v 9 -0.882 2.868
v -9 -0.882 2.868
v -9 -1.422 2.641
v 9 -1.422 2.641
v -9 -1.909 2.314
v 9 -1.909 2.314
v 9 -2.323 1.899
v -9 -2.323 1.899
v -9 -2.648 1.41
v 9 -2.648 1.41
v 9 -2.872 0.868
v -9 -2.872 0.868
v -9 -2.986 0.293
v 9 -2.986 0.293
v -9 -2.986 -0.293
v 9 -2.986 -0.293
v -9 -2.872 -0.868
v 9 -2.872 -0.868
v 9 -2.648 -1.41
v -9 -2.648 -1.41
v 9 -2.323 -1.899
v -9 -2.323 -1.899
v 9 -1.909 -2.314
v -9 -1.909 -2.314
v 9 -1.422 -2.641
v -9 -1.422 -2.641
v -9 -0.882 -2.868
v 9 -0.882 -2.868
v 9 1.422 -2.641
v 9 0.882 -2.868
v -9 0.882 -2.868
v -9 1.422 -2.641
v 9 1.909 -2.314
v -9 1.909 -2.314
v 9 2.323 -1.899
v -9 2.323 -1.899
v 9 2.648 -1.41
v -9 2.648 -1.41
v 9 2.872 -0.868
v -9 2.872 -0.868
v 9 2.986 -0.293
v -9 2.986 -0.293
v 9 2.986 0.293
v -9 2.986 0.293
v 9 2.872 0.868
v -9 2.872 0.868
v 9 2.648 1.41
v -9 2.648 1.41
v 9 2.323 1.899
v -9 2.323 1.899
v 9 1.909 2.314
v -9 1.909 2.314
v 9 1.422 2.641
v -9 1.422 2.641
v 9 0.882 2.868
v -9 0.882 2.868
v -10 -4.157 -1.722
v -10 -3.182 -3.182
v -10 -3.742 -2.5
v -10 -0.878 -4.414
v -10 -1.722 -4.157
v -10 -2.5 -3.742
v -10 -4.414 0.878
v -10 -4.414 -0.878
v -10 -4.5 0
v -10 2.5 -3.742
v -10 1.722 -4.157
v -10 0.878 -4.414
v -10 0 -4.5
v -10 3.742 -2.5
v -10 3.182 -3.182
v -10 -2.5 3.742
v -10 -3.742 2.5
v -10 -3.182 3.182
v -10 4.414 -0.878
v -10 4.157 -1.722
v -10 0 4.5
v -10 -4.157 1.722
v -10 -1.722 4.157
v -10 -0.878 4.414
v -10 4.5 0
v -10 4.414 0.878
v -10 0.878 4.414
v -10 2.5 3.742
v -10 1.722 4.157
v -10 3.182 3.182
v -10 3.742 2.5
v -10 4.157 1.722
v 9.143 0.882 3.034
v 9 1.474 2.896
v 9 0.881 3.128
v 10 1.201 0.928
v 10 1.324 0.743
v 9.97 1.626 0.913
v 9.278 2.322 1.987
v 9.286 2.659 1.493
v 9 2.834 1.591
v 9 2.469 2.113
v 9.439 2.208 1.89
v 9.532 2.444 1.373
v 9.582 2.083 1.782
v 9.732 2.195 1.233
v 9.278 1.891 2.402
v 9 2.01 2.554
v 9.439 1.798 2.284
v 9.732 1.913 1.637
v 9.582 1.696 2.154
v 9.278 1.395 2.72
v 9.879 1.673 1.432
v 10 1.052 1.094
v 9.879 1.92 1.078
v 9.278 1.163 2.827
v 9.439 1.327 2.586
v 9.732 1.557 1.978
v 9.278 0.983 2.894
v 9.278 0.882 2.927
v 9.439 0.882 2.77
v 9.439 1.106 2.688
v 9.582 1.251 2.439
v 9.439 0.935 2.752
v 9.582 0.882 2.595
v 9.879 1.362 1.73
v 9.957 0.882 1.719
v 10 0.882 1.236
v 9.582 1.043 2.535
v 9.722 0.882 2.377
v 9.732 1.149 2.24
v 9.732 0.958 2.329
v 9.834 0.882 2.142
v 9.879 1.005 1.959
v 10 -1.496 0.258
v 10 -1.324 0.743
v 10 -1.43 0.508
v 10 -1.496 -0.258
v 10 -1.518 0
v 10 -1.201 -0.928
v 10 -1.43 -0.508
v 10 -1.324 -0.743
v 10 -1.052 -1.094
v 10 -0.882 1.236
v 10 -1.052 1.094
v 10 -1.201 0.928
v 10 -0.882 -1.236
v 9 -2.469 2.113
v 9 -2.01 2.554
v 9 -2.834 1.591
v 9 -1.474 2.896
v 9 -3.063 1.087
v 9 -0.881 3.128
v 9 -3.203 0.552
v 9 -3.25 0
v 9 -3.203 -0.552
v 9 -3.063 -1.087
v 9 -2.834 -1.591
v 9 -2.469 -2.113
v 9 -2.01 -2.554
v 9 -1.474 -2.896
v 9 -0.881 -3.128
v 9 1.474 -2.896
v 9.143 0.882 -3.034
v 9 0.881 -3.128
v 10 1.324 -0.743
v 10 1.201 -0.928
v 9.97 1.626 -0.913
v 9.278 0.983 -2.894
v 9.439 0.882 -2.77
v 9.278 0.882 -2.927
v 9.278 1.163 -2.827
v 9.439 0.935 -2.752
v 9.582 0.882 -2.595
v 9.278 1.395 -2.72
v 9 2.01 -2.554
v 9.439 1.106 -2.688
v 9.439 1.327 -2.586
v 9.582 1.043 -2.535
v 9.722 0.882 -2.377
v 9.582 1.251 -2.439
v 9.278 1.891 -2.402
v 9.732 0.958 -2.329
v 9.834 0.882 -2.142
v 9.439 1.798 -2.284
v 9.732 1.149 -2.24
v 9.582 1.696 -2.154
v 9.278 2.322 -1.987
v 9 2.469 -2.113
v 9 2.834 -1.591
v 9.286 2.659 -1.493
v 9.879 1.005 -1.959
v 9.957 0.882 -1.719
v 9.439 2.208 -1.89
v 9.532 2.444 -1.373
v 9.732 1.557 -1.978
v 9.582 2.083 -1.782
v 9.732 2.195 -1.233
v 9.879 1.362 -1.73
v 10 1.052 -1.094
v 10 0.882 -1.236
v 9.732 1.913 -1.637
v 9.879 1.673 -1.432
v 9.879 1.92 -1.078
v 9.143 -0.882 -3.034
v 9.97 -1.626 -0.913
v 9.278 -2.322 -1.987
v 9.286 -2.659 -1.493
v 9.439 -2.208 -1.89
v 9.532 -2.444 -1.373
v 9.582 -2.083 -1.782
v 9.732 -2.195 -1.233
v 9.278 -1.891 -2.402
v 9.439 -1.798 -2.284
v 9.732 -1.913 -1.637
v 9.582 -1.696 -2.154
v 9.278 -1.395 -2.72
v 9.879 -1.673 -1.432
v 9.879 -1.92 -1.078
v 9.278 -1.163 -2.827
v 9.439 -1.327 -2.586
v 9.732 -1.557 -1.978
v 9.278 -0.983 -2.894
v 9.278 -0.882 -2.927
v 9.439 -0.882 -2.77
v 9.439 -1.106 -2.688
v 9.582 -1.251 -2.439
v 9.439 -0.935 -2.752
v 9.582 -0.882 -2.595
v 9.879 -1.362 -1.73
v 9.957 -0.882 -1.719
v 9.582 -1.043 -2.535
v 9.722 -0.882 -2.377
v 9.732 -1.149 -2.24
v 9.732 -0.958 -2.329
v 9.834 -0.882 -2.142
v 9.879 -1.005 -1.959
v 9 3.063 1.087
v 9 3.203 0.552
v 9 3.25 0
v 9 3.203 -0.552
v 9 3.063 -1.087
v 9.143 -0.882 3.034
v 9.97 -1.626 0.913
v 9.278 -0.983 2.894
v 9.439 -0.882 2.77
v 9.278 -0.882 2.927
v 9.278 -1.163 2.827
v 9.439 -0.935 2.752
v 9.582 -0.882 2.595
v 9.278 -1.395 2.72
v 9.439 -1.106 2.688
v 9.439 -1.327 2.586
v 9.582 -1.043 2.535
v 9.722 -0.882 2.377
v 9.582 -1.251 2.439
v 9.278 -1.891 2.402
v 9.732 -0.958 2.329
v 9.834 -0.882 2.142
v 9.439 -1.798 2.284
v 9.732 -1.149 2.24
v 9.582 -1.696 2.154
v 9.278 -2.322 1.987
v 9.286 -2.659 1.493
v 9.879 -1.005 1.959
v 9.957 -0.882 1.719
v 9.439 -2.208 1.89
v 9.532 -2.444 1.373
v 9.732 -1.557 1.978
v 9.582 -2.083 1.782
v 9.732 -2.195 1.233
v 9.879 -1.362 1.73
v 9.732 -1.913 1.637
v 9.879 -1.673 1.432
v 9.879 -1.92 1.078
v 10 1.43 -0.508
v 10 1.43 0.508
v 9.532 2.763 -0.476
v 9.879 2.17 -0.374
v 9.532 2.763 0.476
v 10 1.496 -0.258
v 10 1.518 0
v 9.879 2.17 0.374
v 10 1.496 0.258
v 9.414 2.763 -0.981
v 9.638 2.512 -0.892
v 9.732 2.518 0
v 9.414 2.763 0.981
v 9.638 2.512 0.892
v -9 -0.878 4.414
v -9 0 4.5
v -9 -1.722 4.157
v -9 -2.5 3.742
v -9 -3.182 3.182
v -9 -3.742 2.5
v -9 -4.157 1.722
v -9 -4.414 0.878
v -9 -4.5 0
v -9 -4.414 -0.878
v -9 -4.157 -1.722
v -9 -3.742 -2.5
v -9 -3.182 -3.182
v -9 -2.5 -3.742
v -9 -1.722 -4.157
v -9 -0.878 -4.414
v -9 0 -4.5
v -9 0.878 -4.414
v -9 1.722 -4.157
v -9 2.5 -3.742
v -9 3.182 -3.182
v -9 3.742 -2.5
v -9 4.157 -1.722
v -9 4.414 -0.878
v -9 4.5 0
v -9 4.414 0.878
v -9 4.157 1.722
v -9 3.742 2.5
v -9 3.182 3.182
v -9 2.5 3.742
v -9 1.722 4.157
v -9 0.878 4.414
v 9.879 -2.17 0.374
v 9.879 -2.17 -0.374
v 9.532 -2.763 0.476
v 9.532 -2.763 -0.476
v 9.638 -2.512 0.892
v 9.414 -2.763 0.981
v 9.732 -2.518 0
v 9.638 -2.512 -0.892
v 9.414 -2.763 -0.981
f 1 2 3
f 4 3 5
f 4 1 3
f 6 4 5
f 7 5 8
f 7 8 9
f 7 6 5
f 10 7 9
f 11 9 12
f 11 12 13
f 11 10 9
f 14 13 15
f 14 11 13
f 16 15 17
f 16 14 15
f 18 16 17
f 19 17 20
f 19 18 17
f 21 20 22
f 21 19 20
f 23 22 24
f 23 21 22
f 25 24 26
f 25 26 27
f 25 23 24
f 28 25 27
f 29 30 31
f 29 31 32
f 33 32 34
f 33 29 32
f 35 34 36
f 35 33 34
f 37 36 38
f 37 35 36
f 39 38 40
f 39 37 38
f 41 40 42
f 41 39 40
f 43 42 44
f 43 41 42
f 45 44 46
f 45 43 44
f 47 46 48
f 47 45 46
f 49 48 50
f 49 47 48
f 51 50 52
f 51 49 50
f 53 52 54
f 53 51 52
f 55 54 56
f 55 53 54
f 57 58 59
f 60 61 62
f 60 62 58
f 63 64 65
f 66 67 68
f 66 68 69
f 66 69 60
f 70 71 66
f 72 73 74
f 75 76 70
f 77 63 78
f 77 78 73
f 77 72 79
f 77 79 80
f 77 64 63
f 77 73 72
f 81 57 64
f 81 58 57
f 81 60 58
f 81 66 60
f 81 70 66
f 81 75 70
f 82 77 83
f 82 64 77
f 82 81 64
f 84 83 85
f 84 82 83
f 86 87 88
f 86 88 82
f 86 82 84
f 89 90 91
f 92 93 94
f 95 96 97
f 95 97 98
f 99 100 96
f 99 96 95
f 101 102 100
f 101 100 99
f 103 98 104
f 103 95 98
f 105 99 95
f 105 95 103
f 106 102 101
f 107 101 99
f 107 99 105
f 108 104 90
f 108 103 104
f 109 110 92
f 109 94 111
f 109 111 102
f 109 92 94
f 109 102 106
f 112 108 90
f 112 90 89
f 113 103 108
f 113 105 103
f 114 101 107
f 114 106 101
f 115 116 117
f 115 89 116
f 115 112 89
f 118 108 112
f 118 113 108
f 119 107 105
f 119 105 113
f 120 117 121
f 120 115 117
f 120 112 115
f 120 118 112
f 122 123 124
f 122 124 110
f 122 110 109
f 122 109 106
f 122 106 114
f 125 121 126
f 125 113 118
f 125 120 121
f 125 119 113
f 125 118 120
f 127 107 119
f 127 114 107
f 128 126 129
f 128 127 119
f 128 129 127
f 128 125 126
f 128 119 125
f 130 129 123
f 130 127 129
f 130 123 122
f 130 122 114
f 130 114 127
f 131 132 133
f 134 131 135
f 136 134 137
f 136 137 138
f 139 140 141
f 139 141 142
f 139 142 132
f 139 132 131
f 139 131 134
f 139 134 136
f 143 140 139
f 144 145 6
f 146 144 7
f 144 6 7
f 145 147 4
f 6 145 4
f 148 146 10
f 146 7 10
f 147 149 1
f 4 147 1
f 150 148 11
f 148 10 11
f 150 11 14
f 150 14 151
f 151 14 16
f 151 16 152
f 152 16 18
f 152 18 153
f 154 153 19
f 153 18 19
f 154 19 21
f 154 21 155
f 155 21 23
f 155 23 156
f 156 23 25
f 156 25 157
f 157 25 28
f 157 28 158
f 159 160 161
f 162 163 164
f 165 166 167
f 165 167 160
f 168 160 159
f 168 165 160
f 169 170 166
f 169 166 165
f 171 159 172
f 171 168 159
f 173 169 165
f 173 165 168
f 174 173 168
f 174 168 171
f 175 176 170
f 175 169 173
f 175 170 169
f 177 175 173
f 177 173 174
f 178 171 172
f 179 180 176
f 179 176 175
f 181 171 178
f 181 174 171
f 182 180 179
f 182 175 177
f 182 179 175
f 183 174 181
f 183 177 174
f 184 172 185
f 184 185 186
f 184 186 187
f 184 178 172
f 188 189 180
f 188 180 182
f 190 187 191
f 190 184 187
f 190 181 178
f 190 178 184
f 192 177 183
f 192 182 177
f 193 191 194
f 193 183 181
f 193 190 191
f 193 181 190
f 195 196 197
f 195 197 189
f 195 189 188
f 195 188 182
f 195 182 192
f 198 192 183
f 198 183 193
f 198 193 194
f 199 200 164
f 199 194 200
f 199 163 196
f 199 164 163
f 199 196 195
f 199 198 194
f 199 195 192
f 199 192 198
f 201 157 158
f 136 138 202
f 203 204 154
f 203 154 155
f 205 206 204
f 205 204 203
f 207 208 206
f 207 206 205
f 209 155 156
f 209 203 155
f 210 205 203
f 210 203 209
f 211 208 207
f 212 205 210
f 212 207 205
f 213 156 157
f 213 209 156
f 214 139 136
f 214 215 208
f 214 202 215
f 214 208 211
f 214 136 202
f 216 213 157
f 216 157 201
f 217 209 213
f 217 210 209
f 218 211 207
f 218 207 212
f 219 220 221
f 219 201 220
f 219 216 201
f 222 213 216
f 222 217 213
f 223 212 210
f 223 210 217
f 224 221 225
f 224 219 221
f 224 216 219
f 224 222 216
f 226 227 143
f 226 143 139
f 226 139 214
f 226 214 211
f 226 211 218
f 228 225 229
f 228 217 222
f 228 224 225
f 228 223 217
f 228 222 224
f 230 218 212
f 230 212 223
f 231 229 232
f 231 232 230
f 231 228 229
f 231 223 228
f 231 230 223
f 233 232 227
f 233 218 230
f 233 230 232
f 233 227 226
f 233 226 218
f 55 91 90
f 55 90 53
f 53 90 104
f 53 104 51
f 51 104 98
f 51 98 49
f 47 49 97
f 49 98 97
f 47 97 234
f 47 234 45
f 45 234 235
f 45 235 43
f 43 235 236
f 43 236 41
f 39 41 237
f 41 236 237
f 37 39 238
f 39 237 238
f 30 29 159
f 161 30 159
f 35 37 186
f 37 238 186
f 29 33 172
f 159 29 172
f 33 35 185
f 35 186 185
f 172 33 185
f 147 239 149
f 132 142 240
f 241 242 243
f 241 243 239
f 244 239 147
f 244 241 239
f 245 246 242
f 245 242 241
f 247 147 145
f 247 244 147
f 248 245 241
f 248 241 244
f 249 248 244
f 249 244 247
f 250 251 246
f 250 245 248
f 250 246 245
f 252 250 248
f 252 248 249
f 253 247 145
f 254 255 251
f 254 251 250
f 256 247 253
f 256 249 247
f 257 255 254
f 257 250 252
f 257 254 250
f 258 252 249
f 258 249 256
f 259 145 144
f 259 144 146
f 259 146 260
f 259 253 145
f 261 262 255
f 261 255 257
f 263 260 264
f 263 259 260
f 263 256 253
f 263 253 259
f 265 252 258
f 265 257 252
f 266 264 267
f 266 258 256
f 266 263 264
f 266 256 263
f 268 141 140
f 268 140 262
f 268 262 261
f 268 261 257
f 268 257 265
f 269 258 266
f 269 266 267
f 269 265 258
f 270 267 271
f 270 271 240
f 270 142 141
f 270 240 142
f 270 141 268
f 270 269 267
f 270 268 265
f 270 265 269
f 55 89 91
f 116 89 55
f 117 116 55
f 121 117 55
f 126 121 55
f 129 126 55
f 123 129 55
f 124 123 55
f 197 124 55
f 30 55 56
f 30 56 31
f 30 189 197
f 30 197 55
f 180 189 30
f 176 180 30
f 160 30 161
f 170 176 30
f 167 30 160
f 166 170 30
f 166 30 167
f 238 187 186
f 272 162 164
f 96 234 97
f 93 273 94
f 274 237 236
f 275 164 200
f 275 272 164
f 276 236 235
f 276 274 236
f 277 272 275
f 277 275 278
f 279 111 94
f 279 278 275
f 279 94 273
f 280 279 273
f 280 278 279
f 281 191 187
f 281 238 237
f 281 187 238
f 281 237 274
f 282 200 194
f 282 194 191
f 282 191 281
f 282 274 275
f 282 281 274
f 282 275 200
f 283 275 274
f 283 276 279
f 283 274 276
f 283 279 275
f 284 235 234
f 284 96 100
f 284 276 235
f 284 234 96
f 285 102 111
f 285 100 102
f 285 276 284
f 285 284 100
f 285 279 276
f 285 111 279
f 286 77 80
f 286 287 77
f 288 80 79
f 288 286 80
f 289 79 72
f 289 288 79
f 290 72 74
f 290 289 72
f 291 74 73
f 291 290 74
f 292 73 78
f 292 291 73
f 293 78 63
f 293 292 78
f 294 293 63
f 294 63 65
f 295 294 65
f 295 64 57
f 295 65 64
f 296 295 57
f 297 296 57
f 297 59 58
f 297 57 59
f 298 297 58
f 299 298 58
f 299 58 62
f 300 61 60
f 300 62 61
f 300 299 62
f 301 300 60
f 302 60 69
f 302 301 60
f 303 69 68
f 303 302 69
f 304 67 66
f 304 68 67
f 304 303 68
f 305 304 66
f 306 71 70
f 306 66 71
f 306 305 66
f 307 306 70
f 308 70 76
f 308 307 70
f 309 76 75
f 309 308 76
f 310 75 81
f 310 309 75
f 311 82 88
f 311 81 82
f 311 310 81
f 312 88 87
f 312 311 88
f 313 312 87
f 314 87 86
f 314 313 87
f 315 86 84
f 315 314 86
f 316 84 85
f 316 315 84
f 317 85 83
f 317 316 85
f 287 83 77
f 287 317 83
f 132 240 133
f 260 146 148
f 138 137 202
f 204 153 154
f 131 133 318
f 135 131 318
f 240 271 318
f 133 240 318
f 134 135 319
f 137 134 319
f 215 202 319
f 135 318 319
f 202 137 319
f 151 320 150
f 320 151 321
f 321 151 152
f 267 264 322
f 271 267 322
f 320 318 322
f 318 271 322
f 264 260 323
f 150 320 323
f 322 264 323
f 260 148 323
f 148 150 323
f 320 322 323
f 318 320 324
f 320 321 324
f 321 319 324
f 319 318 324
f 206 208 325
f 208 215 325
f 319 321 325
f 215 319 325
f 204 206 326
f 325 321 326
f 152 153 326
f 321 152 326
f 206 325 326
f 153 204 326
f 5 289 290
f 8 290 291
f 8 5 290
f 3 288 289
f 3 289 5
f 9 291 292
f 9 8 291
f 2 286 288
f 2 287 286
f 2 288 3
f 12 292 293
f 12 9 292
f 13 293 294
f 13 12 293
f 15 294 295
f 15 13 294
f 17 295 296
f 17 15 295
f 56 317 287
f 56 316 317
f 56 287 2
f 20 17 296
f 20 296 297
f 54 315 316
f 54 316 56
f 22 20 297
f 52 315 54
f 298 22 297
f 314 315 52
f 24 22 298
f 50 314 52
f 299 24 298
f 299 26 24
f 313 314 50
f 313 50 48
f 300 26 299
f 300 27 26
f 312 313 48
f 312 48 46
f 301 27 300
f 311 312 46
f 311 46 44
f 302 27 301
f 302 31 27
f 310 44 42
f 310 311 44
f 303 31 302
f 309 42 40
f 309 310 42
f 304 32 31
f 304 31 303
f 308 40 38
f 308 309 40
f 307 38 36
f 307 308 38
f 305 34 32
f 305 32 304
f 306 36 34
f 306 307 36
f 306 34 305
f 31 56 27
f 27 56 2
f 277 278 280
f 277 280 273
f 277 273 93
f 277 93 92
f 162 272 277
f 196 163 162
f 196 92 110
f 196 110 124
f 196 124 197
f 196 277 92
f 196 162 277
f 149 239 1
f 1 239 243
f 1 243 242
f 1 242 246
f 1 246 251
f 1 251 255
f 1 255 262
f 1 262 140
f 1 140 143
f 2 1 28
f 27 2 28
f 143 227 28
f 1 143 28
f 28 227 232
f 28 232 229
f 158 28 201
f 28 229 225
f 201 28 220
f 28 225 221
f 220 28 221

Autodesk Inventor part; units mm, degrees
ref_plane "YZ Plane" through (0, 0, 0) normal (1, 0, 0) x (0, 1, 0)
ref_plane "XZ Plane" through (0, 0, 0) normal (0, 1, 0) x (-1, 0, 0)
ref_plane "XY Plane" through (0, 0, 0) normal (0, 0, 1) x (1, 0, 0)
sketch "Sketch1" plane through (0, 0, 0) normal (1, 0, 0) x (0, 1, 0)
  circle A0 centre (0, 0) radius 3
  dimension "d0" = 6
extrude "Extrusion1" add sketch "Sketch1" along normal mid plane 18
sketch "Sketch2" plane through (-9, 0, 0) normal (-1, 0, 0) x (0, 0, 1)
  circle A0 centre (0, 0) radius 4.5
  dimension "d3" = 9
extrude "Extrusion2" add sketch "Sketch2" along normal blind 1
sketch "Sketch3" plane through (9, 0, 0) normal (1, 0, 0) x (0, 0, -1)
  circle A0 centre (0, 0) radius 3.25
  dimension "d6" = 6.5
extrude "Extrusion3" add sketch "Sketch3" along normal blind 1
sketch "Sketch4" plane through (10, 0, 0) normal (1, 0, 0) x (0, 0, -1)
  circle A0 centre (0, 0) radius 3.25 projected
  line L0 (-3.1282, 0.8815) -> (3.1282, 0.8815)
  line L1 (-3.25, 0) -> (3.25, 0)
  line L2 (-3.1282, -0.8815) -> (3.1282, -0.8815)
  arc A1 (-3.1282, 0.8815) -> (-3.1282, -0.8815) centre (0, 0) ccw
  arc A2 (3.1282, -0.8815) -> (3.1282, 0.8815) centre (0, 0) ccw
extrude "Extrusion4" cut sketch "Sketch4" against normal blind 19 contours L1 A0 L0 | A0 L2 L1
fillet "Fillet1" radius 2 2 edges at (10, 3.25, 0) (10, -3.25, 0)
properties part number "OsovinaZaPrednjiKotač_v.1.0"
